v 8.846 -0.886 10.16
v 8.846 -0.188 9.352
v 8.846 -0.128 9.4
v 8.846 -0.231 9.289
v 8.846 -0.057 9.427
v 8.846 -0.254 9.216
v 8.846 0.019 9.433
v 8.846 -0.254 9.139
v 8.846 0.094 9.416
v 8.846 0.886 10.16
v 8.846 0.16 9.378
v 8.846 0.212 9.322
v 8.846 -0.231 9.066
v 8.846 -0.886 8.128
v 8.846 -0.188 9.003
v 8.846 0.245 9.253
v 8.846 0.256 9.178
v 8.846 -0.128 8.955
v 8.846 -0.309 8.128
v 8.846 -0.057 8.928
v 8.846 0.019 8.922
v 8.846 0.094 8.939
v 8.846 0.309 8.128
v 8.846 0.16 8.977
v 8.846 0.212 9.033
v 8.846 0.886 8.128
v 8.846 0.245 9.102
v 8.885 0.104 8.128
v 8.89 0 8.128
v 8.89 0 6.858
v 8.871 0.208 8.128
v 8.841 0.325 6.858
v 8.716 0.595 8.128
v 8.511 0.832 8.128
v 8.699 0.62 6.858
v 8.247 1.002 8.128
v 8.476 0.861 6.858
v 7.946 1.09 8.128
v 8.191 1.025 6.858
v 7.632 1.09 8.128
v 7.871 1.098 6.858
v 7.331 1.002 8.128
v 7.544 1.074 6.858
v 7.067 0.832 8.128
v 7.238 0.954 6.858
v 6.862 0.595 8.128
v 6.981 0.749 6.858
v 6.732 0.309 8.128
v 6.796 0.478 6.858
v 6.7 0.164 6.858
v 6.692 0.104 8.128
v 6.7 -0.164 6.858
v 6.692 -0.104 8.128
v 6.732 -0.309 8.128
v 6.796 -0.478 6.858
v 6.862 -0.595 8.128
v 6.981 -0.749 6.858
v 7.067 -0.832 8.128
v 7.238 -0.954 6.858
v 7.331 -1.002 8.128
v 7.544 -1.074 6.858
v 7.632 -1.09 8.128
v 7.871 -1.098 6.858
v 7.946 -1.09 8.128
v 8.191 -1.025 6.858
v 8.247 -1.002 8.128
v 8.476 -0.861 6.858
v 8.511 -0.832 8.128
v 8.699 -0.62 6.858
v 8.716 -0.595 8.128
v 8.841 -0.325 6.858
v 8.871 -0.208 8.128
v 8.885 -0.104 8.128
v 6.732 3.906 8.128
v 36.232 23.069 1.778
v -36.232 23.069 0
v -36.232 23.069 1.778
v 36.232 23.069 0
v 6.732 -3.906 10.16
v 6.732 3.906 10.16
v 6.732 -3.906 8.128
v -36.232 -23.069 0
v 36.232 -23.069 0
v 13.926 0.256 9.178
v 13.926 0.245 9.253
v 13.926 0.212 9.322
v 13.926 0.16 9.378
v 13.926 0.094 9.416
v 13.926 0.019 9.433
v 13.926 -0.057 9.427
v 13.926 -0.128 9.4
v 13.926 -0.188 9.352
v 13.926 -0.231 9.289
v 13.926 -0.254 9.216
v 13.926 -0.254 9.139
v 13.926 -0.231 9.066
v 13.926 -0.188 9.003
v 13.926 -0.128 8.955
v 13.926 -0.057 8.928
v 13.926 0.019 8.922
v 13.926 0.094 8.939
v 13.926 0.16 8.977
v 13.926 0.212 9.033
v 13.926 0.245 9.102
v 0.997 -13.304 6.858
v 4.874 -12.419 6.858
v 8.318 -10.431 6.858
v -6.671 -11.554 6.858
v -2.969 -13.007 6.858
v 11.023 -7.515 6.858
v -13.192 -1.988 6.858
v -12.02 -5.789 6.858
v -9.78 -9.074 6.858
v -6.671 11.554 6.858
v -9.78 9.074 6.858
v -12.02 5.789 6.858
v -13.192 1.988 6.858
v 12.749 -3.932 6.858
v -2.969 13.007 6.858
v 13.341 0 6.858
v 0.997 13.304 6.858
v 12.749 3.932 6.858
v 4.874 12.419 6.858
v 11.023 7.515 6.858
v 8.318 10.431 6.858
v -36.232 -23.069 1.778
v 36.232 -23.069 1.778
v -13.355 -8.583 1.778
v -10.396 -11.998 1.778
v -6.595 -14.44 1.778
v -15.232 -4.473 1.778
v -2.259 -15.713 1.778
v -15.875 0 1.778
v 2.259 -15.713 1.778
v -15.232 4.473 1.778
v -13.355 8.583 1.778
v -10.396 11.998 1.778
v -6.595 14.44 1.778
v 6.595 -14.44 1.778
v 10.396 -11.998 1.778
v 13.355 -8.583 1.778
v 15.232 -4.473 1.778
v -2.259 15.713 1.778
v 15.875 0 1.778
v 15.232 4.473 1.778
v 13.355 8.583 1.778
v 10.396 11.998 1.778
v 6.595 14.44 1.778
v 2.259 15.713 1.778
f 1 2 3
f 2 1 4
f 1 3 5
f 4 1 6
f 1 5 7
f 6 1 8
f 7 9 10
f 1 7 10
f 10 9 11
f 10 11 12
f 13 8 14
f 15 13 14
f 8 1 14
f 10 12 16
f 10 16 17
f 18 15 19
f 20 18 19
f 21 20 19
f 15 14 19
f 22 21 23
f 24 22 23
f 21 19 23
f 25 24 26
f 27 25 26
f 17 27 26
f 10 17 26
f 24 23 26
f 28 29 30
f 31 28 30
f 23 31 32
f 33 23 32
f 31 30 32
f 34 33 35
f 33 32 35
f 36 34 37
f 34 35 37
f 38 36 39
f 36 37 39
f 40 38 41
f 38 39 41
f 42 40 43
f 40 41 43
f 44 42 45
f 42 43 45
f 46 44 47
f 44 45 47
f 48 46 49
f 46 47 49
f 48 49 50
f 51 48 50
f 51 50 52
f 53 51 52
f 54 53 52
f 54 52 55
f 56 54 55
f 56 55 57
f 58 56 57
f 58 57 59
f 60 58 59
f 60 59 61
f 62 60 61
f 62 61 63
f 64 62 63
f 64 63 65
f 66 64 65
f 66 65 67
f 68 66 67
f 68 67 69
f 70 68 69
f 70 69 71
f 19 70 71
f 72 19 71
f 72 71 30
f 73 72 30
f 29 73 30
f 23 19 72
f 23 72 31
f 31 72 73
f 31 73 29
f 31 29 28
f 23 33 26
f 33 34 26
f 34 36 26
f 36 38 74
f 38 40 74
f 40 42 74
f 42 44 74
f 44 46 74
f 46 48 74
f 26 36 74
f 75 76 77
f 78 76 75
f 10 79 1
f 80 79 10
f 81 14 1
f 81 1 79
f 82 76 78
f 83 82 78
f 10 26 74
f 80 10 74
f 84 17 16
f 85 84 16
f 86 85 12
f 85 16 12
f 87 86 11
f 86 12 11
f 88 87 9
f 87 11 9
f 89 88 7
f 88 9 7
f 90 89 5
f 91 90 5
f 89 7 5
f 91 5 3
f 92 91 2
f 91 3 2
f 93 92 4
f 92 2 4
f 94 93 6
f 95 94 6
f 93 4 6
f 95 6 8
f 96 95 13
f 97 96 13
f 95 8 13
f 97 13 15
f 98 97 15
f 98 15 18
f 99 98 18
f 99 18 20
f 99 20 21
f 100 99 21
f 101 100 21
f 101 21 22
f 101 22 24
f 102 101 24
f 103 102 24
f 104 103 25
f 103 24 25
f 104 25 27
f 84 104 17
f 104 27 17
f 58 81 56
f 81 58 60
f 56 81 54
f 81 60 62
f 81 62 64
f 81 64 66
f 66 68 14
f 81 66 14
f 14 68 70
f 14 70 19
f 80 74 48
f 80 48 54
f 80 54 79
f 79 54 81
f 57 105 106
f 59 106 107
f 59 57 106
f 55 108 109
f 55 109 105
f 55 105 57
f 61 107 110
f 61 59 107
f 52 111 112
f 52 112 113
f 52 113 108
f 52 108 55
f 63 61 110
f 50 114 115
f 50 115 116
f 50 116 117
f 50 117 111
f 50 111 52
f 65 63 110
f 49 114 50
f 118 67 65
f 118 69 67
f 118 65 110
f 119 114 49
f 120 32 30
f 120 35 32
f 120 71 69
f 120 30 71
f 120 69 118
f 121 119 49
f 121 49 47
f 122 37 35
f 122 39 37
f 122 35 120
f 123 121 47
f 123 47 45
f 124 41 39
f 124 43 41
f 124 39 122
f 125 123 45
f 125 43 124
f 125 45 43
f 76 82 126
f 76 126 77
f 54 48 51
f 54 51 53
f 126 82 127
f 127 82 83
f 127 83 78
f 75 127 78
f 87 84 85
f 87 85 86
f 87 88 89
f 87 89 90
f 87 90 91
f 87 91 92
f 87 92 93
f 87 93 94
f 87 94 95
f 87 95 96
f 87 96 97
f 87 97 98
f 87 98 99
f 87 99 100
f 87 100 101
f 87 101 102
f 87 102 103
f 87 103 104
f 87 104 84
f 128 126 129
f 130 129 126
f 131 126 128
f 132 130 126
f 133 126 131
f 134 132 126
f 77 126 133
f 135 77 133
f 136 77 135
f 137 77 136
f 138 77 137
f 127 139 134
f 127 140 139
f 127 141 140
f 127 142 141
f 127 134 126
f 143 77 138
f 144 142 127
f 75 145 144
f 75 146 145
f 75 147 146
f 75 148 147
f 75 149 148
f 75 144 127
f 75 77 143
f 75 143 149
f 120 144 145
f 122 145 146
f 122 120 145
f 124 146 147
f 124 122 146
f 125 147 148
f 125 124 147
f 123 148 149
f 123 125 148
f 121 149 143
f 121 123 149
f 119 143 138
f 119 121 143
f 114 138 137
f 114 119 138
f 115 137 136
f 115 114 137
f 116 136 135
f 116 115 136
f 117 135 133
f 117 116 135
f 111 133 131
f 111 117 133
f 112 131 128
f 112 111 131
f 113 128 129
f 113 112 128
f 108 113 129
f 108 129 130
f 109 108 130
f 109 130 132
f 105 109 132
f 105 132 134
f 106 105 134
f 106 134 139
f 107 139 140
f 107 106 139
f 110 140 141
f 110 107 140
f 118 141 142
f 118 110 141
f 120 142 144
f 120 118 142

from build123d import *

# Parameters (mm, degrees)
F0_W         = 72.464676
F0_H         = 46.138592
F1_DEPTH     = 1.778
F2_R         = 15.875
F4_R         = 13.341257797
F6_R         = 1.1014910557
F7_DEPTH     = 1.27
F9_DEPTH     = 2.032
F10_T1_DEPTH = 15.1513653298
F11_R        = 0.2563999908
F12_DEPTH    = 5.08


# Not quite as in the source:
# - a fillet or chamfer that OpenCascade refuses, or shapes differently, is made with other operations: its cross-section is extruded or revolved along the edge and cut away or added


with BuildPart() as f1:
    # F0 (on Top) → F1 (new body)
    with BuildSketch(Plane.XY):
        Rectangle(F0_W, F0_H)
    extrude(amount=F1_DEPTH)

    # F2 (on face) → F5 section 0
    with BuildSketch(Plane.XY.offset(1.778)):
        Circle(F2_R)
    # F4 (on offset) → F5 section 1
    with BuildSketch(Plane.XY.offset(6.858)):
        Circle(F4_R)
    loft()

    # F6 (on face) → F7 (join)
    with BuildSketch(Plane.XY.offset(6.858)):
        with Locations((7.7888662927, 0)):
            Circle(F6_R)
    extrude(amount=F7_DEPTH)

    # F8 (on face) → F9 (join)
    with BuildSketch(Plane.XY.offset(8.128)):
        with BuildLine():
            Line((6.7317243665, -0.3094082962), (6.7317243665, -5.9662871063))
            Line((6.7317243665, -5.9662871063), (8.8460082188, -5.9662871063))
            Line((8.8460082188, -5.9662871063), (8.8460082188, -0.3094082962))
            ThreePointArc((8.8460082188, -0.3094082962), (7.7888662927, -1.1014910557), (6.7317243665, -0.3094082962))
        make_face()
        with BuildLine():
            Line((6.7317243665, 5.9662871063), (6.7317243665, 0.3094082962))
            ThreePointArc((6.7317243665, 0.3094082962), (7.7888662927, 1.1014910557), (8.8460082188, 0.3094082962))
            Line((8.8460082188, 0.3094082962), (8.8460082188, 5.9662871063))
            Line((8.8460082188, 5.9662871063), (6.7317243665, 5.9662871063))
        make_face()
        with BuildLine():
            Line((6.7317243665, 0.3094082962), (6.7317243665, -0.3094082962))
            ThreePointArc((6.7317243665, -0.3094082962), (7.7888662927, -1.1014910557), (8.8460082188, -0.3094082962))
            Line((8.8460082188, -0.3094082962), (8.8460082188, 0.3094082962))
            ThreePointArc((8.8460082188, 0.3094082962), (7.7888662927, 1.1014910557), (6.7317243665, 0.3094082962))
        make_face()
    extrude(amount=F9_DEPTH)

    # F10: chamfer of 5.08 x 3.5570542941 on 2 edges, made by hand

    # F10_s2 → F10_t1 (cut)
    with BuildSketch(Plane.XY.offset(8.128)):
        Polygon((8.8460082188, -0.8862871063), (5.2889539247, -5.9662871063), (8.8460082188, -5.9662871063), align=None)
        Polygon((8.8460082188, 0.8862871063), (5.2889539247, 5.9662871063), (8.8460082188, 5.9662871063), align=None)
    extrude(amount=F10_T1_DEPTH, mode=Mode.SUBTRACT)

    # F11 (on face) → F12 (join)
    with BuildSketch(Plane.YZ.offset(8.8460082188)):
        with Locations((0, 9.1775208712)):
            Circle(F11_R)
    extrude(amount=F12_DEPTH)


solid = f1.part
